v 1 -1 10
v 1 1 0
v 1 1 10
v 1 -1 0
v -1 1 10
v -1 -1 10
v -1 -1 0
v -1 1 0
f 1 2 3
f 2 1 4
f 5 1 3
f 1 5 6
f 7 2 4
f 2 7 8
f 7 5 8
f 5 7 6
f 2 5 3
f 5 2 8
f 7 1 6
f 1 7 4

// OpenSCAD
translate([0, 0, 5]) color([0,1,0,0.9]) cube([2, 2, 10], center=true);
translate([0.1, -0.6, 1]) color([1,0,0]) cube([0.5, 0.5, 2], center=true);
translate([-0.6, -0.6, 1]) color([1,0,0]) cube([0.5, 0.5, 2], center=true);
translate([-0.6, 0.1, 1]) color([1,0,0]) cube([0.5, 0.5, 2], center=true);
translate([0.1, 0.1, 1]) color([1,0,0]) cube([0.5, 0.5, 2], center=true);
